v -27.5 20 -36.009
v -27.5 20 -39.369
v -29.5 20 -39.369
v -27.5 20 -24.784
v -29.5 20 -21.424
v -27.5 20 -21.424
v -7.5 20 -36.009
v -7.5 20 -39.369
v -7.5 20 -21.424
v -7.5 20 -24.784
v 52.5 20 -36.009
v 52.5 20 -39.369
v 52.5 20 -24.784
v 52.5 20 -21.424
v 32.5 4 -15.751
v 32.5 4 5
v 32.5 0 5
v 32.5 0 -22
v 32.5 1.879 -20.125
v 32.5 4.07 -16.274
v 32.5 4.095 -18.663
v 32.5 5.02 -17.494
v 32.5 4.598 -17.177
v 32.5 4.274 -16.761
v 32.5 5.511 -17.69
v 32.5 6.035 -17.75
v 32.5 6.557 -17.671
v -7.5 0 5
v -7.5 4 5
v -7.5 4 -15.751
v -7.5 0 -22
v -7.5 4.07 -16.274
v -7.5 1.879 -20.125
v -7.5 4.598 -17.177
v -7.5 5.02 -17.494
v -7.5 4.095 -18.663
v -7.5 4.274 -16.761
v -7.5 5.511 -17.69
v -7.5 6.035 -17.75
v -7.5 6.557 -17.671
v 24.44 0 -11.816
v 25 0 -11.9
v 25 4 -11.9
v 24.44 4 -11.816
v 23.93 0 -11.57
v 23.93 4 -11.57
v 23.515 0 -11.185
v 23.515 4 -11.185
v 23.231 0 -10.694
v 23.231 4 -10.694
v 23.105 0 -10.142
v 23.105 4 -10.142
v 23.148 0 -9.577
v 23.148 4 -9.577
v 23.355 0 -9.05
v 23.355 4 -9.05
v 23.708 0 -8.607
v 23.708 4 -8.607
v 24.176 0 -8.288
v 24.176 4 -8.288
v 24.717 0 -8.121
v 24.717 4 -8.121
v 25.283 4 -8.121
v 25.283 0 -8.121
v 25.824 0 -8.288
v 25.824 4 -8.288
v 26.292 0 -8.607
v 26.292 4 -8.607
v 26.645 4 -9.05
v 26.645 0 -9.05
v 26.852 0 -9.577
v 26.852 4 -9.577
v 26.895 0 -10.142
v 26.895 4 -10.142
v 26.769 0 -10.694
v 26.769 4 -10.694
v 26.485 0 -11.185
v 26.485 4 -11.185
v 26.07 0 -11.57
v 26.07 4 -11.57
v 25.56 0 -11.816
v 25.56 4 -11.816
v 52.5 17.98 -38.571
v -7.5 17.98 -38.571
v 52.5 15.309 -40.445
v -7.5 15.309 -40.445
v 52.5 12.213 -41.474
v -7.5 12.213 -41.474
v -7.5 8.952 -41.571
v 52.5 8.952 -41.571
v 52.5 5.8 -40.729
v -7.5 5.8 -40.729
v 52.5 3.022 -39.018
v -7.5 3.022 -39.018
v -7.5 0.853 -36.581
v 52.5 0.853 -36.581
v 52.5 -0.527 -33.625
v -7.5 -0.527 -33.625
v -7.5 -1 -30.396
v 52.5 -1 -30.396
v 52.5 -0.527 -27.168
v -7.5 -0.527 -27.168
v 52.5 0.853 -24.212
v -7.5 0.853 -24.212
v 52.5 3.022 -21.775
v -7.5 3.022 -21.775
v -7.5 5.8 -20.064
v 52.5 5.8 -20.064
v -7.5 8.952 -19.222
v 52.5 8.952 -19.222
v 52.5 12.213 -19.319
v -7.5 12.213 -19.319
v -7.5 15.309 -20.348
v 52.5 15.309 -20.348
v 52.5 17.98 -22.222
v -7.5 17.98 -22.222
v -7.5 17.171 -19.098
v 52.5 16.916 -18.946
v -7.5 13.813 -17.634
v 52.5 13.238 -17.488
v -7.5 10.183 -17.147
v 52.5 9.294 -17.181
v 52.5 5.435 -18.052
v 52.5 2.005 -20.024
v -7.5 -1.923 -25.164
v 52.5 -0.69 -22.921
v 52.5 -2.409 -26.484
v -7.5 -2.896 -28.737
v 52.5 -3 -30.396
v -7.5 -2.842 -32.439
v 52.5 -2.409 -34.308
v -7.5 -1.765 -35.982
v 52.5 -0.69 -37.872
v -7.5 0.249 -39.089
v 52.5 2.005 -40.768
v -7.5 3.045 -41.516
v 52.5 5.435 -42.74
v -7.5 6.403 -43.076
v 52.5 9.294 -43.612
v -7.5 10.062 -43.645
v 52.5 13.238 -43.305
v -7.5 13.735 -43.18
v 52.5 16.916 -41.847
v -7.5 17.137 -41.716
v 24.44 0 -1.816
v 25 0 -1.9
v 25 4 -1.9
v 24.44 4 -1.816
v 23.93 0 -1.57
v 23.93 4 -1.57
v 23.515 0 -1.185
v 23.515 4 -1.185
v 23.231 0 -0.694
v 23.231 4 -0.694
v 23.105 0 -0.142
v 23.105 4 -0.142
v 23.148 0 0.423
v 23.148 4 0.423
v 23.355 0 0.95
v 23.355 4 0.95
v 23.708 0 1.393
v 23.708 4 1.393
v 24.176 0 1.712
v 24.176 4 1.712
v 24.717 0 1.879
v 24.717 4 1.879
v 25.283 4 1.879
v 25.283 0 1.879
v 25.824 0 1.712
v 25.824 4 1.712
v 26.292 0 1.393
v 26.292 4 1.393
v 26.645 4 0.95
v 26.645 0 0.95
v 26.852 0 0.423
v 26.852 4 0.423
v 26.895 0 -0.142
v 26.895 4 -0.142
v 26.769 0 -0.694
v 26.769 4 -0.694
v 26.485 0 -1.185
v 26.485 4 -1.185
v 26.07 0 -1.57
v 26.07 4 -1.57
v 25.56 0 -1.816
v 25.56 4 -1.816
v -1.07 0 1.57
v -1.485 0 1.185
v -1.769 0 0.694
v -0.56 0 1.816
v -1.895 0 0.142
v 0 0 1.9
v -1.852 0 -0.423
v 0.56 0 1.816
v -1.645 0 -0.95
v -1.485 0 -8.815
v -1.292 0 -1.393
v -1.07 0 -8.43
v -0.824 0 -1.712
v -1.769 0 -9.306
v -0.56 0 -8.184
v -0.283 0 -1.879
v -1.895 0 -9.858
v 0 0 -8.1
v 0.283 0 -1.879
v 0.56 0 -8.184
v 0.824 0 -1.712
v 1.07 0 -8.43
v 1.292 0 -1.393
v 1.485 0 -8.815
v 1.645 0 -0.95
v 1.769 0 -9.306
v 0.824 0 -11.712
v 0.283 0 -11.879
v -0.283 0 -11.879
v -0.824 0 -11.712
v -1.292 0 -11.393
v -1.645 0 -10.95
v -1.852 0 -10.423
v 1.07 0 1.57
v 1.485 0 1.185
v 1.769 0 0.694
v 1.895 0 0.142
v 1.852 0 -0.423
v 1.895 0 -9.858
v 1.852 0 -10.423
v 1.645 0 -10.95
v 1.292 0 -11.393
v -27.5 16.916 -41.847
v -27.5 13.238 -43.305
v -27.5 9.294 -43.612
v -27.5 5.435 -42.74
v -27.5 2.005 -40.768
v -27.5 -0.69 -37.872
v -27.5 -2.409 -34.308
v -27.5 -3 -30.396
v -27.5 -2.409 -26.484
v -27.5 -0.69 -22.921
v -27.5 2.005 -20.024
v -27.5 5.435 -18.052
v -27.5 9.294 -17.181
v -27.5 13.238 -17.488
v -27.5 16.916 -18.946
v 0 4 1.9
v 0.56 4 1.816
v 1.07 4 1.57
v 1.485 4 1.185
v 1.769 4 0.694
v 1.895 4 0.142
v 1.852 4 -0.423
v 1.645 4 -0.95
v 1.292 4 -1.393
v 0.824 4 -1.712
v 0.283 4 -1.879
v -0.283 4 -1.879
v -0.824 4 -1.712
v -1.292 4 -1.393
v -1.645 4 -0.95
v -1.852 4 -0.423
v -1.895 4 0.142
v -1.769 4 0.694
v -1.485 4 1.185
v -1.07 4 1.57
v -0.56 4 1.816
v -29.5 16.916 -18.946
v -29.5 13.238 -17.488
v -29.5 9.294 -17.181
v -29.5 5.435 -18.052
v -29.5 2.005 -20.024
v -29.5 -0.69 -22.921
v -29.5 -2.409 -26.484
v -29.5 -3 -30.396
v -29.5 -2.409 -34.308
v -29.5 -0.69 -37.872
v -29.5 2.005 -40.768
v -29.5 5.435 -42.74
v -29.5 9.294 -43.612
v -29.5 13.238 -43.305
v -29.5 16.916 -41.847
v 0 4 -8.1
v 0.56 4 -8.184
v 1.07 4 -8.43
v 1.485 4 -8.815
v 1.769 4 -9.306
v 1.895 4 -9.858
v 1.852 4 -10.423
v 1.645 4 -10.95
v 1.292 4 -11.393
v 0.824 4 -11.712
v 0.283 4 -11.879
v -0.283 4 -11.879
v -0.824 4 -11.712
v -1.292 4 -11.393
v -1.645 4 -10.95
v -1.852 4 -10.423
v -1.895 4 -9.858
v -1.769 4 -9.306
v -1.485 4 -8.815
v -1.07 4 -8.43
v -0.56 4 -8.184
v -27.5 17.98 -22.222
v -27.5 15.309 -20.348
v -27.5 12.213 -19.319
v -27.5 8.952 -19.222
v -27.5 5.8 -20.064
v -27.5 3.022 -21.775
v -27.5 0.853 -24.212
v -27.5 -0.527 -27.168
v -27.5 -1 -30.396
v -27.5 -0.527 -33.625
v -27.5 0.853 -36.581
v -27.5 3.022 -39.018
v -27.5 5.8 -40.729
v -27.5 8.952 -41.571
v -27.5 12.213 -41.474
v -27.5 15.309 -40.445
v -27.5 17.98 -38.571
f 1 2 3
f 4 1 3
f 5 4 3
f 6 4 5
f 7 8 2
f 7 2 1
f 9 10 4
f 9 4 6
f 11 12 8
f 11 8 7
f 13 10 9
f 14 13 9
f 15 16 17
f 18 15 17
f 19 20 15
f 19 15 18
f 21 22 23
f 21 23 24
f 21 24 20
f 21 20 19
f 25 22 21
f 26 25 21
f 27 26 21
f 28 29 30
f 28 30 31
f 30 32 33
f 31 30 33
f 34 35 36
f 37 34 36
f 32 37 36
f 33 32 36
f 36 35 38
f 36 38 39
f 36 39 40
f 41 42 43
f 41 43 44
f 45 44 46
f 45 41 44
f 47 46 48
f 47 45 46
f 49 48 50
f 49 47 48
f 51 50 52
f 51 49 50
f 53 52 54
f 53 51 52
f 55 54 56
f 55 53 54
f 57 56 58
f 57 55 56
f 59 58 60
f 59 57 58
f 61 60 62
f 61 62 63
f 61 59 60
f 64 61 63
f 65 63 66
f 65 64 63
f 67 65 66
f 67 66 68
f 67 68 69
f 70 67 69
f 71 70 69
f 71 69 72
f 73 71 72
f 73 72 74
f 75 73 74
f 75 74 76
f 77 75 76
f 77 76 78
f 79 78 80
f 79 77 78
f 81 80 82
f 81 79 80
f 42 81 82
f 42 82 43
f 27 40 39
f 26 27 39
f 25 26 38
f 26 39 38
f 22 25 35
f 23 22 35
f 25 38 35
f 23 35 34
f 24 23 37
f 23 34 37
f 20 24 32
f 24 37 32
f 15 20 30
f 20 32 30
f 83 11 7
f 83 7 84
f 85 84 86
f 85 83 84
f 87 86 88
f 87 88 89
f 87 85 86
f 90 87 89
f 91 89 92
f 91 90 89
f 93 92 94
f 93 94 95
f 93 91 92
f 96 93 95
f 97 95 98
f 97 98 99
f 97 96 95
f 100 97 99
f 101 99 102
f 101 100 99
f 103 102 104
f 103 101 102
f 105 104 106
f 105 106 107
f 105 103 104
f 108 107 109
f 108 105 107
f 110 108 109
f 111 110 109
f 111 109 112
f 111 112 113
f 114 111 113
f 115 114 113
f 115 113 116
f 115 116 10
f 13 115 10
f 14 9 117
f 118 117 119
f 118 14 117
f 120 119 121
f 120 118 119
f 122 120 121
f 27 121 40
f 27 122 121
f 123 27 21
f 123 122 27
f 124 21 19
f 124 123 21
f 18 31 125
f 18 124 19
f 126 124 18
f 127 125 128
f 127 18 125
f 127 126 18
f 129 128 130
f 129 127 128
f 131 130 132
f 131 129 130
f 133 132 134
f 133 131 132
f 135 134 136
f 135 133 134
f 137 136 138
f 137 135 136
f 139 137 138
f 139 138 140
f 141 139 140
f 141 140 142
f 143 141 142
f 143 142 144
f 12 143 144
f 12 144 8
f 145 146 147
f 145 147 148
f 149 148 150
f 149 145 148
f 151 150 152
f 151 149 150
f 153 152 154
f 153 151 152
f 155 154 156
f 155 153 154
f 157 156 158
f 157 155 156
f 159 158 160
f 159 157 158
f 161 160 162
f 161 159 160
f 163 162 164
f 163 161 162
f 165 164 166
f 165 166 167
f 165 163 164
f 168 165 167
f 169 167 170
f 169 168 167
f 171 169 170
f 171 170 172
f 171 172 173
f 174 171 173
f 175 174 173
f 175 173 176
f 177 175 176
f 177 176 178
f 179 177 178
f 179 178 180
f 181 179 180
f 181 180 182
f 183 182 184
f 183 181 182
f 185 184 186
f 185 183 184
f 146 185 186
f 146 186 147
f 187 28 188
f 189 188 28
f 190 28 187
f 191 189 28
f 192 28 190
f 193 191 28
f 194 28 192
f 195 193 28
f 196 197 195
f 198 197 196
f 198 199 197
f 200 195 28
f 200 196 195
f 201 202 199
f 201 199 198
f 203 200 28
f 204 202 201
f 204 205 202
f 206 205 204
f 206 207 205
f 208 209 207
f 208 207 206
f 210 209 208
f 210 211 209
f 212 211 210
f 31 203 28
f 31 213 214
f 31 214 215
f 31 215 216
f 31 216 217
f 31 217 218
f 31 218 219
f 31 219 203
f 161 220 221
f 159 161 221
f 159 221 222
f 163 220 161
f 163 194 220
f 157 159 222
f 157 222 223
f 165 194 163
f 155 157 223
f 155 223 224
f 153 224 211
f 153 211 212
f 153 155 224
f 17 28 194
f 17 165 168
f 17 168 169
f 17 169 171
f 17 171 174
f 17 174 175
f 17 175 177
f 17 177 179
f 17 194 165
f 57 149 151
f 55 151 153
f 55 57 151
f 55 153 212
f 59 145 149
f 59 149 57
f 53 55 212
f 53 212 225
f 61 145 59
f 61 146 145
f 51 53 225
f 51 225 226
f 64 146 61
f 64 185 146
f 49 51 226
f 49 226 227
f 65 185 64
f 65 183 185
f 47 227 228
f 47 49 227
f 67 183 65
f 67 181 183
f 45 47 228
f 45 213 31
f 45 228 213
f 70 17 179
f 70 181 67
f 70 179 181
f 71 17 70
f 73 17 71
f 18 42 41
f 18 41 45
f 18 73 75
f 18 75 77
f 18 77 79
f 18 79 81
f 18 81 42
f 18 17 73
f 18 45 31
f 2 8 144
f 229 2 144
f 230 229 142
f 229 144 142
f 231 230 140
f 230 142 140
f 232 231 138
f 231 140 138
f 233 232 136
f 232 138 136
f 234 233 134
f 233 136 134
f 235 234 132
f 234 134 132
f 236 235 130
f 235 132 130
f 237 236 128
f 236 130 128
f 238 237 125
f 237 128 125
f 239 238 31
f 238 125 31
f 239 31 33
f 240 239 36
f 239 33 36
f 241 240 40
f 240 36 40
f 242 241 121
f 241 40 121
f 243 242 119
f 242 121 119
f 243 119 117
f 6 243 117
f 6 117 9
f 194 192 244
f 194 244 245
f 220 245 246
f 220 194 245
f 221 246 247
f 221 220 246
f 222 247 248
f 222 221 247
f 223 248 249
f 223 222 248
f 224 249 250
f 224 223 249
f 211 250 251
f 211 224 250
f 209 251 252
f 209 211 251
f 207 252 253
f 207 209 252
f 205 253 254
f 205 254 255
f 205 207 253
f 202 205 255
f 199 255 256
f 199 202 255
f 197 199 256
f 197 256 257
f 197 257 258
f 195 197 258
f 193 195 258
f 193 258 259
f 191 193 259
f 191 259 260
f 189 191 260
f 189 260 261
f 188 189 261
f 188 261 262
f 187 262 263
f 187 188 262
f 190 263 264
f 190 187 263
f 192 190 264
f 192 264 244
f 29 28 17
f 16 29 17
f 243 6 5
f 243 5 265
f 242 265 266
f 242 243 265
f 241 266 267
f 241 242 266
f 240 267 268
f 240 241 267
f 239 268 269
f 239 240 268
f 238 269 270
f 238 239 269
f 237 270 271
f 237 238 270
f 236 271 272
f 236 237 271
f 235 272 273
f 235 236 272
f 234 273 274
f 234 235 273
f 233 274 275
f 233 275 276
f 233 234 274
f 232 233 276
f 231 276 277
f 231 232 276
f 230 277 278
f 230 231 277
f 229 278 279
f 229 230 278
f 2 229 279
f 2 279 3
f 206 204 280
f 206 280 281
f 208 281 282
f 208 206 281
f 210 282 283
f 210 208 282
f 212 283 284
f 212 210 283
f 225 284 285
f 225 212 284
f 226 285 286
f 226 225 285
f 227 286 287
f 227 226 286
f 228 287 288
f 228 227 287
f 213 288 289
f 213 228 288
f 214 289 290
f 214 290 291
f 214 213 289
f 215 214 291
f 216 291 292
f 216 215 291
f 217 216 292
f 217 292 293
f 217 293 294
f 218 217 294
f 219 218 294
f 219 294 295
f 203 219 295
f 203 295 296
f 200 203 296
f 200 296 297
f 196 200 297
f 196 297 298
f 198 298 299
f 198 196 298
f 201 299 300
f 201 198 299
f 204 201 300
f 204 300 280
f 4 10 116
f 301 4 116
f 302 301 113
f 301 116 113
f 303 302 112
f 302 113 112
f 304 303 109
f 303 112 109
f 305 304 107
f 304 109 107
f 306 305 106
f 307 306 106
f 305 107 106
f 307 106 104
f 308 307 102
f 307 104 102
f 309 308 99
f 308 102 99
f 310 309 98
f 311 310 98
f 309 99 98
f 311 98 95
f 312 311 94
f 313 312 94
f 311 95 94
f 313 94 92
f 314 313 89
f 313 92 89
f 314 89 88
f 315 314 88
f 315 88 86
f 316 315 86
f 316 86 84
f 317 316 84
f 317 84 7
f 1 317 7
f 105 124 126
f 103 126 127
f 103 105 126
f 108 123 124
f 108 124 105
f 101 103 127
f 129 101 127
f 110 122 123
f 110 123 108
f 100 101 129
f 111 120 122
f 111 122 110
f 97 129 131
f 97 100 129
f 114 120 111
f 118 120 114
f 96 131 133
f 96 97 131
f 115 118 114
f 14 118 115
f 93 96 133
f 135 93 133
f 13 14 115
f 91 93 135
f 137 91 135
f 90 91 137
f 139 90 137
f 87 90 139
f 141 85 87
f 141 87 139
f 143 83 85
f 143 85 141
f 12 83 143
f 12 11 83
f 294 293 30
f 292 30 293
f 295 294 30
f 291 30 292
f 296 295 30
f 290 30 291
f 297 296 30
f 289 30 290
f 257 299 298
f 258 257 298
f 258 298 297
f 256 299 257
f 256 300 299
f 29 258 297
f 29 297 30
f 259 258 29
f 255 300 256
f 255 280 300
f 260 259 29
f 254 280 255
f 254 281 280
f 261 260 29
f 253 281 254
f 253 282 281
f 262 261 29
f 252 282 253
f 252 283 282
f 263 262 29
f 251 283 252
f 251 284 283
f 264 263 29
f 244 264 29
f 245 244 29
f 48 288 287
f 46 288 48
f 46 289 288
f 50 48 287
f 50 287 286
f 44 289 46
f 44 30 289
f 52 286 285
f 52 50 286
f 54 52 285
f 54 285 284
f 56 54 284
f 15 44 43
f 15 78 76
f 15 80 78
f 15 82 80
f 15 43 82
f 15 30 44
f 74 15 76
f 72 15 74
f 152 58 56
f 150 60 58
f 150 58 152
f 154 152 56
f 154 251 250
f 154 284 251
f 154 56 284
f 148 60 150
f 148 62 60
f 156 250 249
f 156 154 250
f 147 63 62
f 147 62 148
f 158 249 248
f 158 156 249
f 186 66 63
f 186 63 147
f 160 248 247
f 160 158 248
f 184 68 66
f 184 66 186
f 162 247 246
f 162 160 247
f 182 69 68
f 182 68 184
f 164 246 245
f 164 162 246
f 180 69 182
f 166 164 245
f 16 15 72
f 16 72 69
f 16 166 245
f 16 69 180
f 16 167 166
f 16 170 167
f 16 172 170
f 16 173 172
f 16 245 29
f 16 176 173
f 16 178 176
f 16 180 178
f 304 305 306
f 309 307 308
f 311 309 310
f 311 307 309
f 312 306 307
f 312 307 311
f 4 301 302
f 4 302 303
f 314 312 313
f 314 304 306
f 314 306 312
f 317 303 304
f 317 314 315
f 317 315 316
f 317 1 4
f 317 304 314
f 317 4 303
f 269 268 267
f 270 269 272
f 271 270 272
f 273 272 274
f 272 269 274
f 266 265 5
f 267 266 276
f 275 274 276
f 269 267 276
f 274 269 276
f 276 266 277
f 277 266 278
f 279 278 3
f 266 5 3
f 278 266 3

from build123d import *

# Parameters (mm, degrees)
SKETCH1_W           = 40
SKETCH1_H           = 20
SKETCH1_R           = 1.9
BOSS_EXTRUDE1_DEPTH = 4
BOSS_EXTRUDE2_DEPTH = 40
BOSS_EXTRUDE3_START = 20
BOSS_EXTRUDE3_DEPTH = 20
BOSS_EXTRUDE4_DEPTH = 20
FILLET1_R           = 2
BOSS_EXTRUDE5_DEPTH = 2


with BuildPart() as part:
    # Sketch1 → Boss-Extrude1 (new body)
    with BuildSketch(Plane(origin=(0, 0, 0), x_dir=(1, 0, 0), z_dir=(0, 1, 0))):
        with Locations((12.5, 5)):
            Rectangle(SKETCH1_W, SKETCH1_H)
        with Locations(Location((0, 0, 0), (0, 0, 270))):
            Circle(SKETCH1_R, mode=Mode.SUBTRACT)
        with Locations(Location((0, 10, 0), (0, 0, 270))):
            Circle(SKETCH1_R, mode=Mode.SUBTRACT)
        with Locations(Location((25, 10, 0), (0, 0, 90))):
            Circle(SKETCH1_R, mode=Mode.SUBTRACT)
        with Locations(Location((25, 0, 0), (0, 0, 90))):
            Circle(SKETCH1_R, mode=Mode.SUBTRACT)
    extrude(amount=BOSS_EXTRUDE1_DEPTH)

    # Sketch3 → Boss-Extrude2 (add)
    with BuildSketch(Plane(origin=(32.5, 0, 0), x_dir=(0, 0, -1), z_dir=(1, 0, 0))):
        with BuildLine():
            ThreePointArc((22, 0), (20.159285507, 1.837900533), (18.713106366, 4))
            Line((18.713106366, 4), (15, 4))
            Line((15, 4), (15, 0))
            Line((15, 0), (22, 0))
        make_face()
        with BuildLine():
            Line((24.783941732, 20), (21.424248589, 20))
            ThreePointArc((21.424248589, 20), (30.396427812, -3), (39.368607034, 20))
            Line((39.368607034, 20), (36.008913892, 20))
            ThreePointArc((36.008913892, 20), (30.396427812, -1), (24.783941732, 20))
        make_face()
    extrude(amount=-BOSS_EXTRUDE2_DEPTH)

    # Sketch4 → Boss-Extrude3 (add)
    with BuildSketch(Plane(origin=(32.5, 0, 0), x_dir=(0, 0, -1), z_dir=(1, 0, 0)).offset(BOSS_EXTRUDE3_START)):
        with BuildLine():
            Line((24.783941732, 20), (21.424248589, 20))
            ThreePointArc((21.424248589, 20), (30.396427812, -3), (39.368607034, 20))
            Line((39.368607034, 20), (36.008913892, 20))
            ThreePointArc((36.008913892, 20), (30.396427812, -1), (24.783941732, 20))
        make_face()
    extrude(amount=-BOSS_EXTRUDE3_DEPTH)

    # Sketch5 → Boss-Extrude4 (add)
    with BuildSketch(Plane.ZY.offset(7.5)):
        with BuildLine():
            Line((-21.424248589, 20), (-24.783941732, 20))
            ThreePointArc((-24.783941732, 20), (-30.396427812, -1), (-36.008913892, 20))
            Line((-36.008913892, 20), (-39.368607034, 20))
            ThreePointArc((-39.368607034, 20), (-30.396427812, -3), (-21.424248589, 20))
        make_face()
    extrude(amount=BOSS_EXTRUDE4_DEPTH)

    # Fillet1
    fillet1_edges = [part.edges().sort_by_distance(p)[0] for p in [
        (12.5, 4, -18.713106366),
    ]]
    fillet(fillet1_edges, radius=FILLET1_R)

    # Sketch7 → Boss-Extrude5 (add)
    with BuildSketch(Plane.ZY.offset(27.5)):
        with BuildLine():
            Line((-39.368607034, 20), (-21.424248589, 20))
            ThreePointArc((-21.424248589, 20), (-30.396427812, -3), (-39.368607034, 20))
        make_face()
    extrude(amount=BOSS_EXTRUDE5_DEPTH)


solid = part.part
